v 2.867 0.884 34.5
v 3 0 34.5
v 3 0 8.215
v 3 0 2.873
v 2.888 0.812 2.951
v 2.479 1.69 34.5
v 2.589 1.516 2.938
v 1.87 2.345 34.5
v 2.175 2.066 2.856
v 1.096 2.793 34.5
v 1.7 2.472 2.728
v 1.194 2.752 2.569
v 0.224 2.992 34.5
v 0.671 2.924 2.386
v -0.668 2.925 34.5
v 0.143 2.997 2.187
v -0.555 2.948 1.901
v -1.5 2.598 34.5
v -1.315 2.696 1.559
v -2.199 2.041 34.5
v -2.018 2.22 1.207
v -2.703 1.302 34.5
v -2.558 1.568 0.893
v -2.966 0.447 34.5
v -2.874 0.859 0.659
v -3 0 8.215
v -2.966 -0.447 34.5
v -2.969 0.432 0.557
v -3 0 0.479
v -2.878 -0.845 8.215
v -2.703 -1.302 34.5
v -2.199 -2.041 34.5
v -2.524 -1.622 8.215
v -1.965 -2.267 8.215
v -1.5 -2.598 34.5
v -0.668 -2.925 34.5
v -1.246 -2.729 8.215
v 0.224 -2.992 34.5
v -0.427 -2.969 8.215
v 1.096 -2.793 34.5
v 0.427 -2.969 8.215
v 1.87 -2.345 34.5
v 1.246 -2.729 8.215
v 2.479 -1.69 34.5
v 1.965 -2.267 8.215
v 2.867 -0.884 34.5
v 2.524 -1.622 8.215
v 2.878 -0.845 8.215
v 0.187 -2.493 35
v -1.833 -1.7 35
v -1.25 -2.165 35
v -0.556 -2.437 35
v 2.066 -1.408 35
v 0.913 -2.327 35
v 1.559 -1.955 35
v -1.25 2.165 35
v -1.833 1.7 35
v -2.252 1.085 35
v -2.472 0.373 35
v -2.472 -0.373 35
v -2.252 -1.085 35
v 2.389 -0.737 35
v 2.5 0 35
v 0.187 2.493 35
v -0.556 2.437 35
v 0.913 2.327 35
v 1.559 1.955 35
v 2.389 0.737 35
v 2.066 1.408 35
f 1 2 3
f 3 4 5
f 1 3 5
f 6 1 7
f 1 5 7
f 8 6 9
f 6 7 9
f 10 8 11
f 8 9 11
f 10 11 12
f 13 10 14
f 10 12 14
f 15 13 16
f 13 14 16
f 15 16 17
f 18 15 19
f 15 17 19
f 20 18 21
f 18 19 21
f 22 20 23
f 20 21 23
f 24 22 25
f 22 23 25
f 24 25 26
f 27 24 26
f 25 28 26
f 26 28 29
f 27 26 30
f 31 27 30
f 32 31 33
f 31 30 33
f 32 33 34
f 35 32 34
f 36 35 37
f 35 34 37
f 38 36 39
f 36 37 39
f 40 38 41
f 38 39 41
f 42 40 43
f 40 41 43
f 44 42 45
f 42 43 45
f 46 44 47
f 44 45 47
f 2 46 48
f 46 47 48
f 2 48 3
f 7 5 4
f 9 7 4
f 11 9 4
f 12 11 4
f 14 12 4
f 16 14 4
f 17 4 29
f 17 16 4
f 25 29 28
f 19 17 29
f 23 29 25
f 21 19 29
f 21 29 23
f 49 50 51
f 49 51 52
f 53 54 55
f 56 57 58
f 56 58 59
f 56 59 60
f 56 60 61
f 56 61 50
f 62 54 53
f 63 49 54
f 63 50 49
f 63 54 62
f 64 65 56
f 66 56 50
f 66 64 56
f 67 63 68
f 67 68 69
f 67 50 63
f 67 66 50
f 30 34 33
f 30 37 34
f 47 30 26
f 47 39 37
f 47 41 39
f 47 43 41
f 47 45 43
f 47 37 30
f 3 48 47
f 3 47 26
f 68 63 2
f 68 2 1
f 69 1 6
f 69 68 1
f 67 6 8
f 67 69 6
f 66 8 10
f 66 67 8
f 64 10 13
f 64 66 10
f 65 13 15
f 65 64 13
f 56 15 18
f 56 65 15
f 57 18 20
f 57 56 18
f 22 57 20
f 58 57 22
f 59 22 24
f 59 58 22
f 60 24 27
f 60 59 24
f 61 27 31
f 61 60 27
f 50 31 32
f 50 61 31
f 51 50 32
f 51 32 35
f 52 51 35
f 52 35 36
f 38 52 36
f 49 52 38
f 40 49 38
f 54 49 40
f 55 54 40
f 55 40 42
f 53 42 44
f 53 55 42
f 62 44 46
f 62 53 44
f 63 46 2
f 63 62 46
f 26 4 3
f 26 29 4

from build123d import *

# Parameters (mm, degrees)
F0_R          = 3
F1_DEPTH      = 35
F2_SIZE       = 0.5
F3_W          = 14.1636701301
F3_H          = 25.4946053028
F4_DEPTH      = 25
F4_DEPTH_BACK = 25
F6_DEPTH      = 25
F6_TAPER      = -8


with BuildPart() as f1:
    # F0 (on Top) → F1 (new body)
    with BuildSketch(Plane.XY):
        Circle(F0_R)
    extrude(amount=F1_DEPTH)

    # F2
    f2_edges = [f1.edges().sort_by_distance(p)[0] for p in [
        (-3, 0, 35),
    ]]
    chamfer(f2_edges, length=F2_SIZE)

    # F3 (on Right) → F4 (cut, two sides)
    with BuildSketch(Plane.YZ) as f4_sk:
        with Locations((-7.081835065, -4.5323744416)):
            Rectangle(F3_W, F3_H)
    extrude(amount=-F4_DEPTH, mode=Mode.SUBTRACT)
    extrude(f4_sk.sketch, amount=F4_DEPTH_BACK, mode=Mode.SUBTRACT)

    # F5 (on Front) → F6 (cut)
    with BuildSketch(Plane.XZ):
        Polygon((30.5935237557, -28.8938842714), (30.5935237557, 13.8803962618), (-26.6276989132, -8.9460639283), (-26.6276989132, -10.4811154306), align=None)
    extrude(amount=-F6_DEPTH, taper=F6_TAPER, mode=Mode.SUBTRACT)


solid = f1.part
